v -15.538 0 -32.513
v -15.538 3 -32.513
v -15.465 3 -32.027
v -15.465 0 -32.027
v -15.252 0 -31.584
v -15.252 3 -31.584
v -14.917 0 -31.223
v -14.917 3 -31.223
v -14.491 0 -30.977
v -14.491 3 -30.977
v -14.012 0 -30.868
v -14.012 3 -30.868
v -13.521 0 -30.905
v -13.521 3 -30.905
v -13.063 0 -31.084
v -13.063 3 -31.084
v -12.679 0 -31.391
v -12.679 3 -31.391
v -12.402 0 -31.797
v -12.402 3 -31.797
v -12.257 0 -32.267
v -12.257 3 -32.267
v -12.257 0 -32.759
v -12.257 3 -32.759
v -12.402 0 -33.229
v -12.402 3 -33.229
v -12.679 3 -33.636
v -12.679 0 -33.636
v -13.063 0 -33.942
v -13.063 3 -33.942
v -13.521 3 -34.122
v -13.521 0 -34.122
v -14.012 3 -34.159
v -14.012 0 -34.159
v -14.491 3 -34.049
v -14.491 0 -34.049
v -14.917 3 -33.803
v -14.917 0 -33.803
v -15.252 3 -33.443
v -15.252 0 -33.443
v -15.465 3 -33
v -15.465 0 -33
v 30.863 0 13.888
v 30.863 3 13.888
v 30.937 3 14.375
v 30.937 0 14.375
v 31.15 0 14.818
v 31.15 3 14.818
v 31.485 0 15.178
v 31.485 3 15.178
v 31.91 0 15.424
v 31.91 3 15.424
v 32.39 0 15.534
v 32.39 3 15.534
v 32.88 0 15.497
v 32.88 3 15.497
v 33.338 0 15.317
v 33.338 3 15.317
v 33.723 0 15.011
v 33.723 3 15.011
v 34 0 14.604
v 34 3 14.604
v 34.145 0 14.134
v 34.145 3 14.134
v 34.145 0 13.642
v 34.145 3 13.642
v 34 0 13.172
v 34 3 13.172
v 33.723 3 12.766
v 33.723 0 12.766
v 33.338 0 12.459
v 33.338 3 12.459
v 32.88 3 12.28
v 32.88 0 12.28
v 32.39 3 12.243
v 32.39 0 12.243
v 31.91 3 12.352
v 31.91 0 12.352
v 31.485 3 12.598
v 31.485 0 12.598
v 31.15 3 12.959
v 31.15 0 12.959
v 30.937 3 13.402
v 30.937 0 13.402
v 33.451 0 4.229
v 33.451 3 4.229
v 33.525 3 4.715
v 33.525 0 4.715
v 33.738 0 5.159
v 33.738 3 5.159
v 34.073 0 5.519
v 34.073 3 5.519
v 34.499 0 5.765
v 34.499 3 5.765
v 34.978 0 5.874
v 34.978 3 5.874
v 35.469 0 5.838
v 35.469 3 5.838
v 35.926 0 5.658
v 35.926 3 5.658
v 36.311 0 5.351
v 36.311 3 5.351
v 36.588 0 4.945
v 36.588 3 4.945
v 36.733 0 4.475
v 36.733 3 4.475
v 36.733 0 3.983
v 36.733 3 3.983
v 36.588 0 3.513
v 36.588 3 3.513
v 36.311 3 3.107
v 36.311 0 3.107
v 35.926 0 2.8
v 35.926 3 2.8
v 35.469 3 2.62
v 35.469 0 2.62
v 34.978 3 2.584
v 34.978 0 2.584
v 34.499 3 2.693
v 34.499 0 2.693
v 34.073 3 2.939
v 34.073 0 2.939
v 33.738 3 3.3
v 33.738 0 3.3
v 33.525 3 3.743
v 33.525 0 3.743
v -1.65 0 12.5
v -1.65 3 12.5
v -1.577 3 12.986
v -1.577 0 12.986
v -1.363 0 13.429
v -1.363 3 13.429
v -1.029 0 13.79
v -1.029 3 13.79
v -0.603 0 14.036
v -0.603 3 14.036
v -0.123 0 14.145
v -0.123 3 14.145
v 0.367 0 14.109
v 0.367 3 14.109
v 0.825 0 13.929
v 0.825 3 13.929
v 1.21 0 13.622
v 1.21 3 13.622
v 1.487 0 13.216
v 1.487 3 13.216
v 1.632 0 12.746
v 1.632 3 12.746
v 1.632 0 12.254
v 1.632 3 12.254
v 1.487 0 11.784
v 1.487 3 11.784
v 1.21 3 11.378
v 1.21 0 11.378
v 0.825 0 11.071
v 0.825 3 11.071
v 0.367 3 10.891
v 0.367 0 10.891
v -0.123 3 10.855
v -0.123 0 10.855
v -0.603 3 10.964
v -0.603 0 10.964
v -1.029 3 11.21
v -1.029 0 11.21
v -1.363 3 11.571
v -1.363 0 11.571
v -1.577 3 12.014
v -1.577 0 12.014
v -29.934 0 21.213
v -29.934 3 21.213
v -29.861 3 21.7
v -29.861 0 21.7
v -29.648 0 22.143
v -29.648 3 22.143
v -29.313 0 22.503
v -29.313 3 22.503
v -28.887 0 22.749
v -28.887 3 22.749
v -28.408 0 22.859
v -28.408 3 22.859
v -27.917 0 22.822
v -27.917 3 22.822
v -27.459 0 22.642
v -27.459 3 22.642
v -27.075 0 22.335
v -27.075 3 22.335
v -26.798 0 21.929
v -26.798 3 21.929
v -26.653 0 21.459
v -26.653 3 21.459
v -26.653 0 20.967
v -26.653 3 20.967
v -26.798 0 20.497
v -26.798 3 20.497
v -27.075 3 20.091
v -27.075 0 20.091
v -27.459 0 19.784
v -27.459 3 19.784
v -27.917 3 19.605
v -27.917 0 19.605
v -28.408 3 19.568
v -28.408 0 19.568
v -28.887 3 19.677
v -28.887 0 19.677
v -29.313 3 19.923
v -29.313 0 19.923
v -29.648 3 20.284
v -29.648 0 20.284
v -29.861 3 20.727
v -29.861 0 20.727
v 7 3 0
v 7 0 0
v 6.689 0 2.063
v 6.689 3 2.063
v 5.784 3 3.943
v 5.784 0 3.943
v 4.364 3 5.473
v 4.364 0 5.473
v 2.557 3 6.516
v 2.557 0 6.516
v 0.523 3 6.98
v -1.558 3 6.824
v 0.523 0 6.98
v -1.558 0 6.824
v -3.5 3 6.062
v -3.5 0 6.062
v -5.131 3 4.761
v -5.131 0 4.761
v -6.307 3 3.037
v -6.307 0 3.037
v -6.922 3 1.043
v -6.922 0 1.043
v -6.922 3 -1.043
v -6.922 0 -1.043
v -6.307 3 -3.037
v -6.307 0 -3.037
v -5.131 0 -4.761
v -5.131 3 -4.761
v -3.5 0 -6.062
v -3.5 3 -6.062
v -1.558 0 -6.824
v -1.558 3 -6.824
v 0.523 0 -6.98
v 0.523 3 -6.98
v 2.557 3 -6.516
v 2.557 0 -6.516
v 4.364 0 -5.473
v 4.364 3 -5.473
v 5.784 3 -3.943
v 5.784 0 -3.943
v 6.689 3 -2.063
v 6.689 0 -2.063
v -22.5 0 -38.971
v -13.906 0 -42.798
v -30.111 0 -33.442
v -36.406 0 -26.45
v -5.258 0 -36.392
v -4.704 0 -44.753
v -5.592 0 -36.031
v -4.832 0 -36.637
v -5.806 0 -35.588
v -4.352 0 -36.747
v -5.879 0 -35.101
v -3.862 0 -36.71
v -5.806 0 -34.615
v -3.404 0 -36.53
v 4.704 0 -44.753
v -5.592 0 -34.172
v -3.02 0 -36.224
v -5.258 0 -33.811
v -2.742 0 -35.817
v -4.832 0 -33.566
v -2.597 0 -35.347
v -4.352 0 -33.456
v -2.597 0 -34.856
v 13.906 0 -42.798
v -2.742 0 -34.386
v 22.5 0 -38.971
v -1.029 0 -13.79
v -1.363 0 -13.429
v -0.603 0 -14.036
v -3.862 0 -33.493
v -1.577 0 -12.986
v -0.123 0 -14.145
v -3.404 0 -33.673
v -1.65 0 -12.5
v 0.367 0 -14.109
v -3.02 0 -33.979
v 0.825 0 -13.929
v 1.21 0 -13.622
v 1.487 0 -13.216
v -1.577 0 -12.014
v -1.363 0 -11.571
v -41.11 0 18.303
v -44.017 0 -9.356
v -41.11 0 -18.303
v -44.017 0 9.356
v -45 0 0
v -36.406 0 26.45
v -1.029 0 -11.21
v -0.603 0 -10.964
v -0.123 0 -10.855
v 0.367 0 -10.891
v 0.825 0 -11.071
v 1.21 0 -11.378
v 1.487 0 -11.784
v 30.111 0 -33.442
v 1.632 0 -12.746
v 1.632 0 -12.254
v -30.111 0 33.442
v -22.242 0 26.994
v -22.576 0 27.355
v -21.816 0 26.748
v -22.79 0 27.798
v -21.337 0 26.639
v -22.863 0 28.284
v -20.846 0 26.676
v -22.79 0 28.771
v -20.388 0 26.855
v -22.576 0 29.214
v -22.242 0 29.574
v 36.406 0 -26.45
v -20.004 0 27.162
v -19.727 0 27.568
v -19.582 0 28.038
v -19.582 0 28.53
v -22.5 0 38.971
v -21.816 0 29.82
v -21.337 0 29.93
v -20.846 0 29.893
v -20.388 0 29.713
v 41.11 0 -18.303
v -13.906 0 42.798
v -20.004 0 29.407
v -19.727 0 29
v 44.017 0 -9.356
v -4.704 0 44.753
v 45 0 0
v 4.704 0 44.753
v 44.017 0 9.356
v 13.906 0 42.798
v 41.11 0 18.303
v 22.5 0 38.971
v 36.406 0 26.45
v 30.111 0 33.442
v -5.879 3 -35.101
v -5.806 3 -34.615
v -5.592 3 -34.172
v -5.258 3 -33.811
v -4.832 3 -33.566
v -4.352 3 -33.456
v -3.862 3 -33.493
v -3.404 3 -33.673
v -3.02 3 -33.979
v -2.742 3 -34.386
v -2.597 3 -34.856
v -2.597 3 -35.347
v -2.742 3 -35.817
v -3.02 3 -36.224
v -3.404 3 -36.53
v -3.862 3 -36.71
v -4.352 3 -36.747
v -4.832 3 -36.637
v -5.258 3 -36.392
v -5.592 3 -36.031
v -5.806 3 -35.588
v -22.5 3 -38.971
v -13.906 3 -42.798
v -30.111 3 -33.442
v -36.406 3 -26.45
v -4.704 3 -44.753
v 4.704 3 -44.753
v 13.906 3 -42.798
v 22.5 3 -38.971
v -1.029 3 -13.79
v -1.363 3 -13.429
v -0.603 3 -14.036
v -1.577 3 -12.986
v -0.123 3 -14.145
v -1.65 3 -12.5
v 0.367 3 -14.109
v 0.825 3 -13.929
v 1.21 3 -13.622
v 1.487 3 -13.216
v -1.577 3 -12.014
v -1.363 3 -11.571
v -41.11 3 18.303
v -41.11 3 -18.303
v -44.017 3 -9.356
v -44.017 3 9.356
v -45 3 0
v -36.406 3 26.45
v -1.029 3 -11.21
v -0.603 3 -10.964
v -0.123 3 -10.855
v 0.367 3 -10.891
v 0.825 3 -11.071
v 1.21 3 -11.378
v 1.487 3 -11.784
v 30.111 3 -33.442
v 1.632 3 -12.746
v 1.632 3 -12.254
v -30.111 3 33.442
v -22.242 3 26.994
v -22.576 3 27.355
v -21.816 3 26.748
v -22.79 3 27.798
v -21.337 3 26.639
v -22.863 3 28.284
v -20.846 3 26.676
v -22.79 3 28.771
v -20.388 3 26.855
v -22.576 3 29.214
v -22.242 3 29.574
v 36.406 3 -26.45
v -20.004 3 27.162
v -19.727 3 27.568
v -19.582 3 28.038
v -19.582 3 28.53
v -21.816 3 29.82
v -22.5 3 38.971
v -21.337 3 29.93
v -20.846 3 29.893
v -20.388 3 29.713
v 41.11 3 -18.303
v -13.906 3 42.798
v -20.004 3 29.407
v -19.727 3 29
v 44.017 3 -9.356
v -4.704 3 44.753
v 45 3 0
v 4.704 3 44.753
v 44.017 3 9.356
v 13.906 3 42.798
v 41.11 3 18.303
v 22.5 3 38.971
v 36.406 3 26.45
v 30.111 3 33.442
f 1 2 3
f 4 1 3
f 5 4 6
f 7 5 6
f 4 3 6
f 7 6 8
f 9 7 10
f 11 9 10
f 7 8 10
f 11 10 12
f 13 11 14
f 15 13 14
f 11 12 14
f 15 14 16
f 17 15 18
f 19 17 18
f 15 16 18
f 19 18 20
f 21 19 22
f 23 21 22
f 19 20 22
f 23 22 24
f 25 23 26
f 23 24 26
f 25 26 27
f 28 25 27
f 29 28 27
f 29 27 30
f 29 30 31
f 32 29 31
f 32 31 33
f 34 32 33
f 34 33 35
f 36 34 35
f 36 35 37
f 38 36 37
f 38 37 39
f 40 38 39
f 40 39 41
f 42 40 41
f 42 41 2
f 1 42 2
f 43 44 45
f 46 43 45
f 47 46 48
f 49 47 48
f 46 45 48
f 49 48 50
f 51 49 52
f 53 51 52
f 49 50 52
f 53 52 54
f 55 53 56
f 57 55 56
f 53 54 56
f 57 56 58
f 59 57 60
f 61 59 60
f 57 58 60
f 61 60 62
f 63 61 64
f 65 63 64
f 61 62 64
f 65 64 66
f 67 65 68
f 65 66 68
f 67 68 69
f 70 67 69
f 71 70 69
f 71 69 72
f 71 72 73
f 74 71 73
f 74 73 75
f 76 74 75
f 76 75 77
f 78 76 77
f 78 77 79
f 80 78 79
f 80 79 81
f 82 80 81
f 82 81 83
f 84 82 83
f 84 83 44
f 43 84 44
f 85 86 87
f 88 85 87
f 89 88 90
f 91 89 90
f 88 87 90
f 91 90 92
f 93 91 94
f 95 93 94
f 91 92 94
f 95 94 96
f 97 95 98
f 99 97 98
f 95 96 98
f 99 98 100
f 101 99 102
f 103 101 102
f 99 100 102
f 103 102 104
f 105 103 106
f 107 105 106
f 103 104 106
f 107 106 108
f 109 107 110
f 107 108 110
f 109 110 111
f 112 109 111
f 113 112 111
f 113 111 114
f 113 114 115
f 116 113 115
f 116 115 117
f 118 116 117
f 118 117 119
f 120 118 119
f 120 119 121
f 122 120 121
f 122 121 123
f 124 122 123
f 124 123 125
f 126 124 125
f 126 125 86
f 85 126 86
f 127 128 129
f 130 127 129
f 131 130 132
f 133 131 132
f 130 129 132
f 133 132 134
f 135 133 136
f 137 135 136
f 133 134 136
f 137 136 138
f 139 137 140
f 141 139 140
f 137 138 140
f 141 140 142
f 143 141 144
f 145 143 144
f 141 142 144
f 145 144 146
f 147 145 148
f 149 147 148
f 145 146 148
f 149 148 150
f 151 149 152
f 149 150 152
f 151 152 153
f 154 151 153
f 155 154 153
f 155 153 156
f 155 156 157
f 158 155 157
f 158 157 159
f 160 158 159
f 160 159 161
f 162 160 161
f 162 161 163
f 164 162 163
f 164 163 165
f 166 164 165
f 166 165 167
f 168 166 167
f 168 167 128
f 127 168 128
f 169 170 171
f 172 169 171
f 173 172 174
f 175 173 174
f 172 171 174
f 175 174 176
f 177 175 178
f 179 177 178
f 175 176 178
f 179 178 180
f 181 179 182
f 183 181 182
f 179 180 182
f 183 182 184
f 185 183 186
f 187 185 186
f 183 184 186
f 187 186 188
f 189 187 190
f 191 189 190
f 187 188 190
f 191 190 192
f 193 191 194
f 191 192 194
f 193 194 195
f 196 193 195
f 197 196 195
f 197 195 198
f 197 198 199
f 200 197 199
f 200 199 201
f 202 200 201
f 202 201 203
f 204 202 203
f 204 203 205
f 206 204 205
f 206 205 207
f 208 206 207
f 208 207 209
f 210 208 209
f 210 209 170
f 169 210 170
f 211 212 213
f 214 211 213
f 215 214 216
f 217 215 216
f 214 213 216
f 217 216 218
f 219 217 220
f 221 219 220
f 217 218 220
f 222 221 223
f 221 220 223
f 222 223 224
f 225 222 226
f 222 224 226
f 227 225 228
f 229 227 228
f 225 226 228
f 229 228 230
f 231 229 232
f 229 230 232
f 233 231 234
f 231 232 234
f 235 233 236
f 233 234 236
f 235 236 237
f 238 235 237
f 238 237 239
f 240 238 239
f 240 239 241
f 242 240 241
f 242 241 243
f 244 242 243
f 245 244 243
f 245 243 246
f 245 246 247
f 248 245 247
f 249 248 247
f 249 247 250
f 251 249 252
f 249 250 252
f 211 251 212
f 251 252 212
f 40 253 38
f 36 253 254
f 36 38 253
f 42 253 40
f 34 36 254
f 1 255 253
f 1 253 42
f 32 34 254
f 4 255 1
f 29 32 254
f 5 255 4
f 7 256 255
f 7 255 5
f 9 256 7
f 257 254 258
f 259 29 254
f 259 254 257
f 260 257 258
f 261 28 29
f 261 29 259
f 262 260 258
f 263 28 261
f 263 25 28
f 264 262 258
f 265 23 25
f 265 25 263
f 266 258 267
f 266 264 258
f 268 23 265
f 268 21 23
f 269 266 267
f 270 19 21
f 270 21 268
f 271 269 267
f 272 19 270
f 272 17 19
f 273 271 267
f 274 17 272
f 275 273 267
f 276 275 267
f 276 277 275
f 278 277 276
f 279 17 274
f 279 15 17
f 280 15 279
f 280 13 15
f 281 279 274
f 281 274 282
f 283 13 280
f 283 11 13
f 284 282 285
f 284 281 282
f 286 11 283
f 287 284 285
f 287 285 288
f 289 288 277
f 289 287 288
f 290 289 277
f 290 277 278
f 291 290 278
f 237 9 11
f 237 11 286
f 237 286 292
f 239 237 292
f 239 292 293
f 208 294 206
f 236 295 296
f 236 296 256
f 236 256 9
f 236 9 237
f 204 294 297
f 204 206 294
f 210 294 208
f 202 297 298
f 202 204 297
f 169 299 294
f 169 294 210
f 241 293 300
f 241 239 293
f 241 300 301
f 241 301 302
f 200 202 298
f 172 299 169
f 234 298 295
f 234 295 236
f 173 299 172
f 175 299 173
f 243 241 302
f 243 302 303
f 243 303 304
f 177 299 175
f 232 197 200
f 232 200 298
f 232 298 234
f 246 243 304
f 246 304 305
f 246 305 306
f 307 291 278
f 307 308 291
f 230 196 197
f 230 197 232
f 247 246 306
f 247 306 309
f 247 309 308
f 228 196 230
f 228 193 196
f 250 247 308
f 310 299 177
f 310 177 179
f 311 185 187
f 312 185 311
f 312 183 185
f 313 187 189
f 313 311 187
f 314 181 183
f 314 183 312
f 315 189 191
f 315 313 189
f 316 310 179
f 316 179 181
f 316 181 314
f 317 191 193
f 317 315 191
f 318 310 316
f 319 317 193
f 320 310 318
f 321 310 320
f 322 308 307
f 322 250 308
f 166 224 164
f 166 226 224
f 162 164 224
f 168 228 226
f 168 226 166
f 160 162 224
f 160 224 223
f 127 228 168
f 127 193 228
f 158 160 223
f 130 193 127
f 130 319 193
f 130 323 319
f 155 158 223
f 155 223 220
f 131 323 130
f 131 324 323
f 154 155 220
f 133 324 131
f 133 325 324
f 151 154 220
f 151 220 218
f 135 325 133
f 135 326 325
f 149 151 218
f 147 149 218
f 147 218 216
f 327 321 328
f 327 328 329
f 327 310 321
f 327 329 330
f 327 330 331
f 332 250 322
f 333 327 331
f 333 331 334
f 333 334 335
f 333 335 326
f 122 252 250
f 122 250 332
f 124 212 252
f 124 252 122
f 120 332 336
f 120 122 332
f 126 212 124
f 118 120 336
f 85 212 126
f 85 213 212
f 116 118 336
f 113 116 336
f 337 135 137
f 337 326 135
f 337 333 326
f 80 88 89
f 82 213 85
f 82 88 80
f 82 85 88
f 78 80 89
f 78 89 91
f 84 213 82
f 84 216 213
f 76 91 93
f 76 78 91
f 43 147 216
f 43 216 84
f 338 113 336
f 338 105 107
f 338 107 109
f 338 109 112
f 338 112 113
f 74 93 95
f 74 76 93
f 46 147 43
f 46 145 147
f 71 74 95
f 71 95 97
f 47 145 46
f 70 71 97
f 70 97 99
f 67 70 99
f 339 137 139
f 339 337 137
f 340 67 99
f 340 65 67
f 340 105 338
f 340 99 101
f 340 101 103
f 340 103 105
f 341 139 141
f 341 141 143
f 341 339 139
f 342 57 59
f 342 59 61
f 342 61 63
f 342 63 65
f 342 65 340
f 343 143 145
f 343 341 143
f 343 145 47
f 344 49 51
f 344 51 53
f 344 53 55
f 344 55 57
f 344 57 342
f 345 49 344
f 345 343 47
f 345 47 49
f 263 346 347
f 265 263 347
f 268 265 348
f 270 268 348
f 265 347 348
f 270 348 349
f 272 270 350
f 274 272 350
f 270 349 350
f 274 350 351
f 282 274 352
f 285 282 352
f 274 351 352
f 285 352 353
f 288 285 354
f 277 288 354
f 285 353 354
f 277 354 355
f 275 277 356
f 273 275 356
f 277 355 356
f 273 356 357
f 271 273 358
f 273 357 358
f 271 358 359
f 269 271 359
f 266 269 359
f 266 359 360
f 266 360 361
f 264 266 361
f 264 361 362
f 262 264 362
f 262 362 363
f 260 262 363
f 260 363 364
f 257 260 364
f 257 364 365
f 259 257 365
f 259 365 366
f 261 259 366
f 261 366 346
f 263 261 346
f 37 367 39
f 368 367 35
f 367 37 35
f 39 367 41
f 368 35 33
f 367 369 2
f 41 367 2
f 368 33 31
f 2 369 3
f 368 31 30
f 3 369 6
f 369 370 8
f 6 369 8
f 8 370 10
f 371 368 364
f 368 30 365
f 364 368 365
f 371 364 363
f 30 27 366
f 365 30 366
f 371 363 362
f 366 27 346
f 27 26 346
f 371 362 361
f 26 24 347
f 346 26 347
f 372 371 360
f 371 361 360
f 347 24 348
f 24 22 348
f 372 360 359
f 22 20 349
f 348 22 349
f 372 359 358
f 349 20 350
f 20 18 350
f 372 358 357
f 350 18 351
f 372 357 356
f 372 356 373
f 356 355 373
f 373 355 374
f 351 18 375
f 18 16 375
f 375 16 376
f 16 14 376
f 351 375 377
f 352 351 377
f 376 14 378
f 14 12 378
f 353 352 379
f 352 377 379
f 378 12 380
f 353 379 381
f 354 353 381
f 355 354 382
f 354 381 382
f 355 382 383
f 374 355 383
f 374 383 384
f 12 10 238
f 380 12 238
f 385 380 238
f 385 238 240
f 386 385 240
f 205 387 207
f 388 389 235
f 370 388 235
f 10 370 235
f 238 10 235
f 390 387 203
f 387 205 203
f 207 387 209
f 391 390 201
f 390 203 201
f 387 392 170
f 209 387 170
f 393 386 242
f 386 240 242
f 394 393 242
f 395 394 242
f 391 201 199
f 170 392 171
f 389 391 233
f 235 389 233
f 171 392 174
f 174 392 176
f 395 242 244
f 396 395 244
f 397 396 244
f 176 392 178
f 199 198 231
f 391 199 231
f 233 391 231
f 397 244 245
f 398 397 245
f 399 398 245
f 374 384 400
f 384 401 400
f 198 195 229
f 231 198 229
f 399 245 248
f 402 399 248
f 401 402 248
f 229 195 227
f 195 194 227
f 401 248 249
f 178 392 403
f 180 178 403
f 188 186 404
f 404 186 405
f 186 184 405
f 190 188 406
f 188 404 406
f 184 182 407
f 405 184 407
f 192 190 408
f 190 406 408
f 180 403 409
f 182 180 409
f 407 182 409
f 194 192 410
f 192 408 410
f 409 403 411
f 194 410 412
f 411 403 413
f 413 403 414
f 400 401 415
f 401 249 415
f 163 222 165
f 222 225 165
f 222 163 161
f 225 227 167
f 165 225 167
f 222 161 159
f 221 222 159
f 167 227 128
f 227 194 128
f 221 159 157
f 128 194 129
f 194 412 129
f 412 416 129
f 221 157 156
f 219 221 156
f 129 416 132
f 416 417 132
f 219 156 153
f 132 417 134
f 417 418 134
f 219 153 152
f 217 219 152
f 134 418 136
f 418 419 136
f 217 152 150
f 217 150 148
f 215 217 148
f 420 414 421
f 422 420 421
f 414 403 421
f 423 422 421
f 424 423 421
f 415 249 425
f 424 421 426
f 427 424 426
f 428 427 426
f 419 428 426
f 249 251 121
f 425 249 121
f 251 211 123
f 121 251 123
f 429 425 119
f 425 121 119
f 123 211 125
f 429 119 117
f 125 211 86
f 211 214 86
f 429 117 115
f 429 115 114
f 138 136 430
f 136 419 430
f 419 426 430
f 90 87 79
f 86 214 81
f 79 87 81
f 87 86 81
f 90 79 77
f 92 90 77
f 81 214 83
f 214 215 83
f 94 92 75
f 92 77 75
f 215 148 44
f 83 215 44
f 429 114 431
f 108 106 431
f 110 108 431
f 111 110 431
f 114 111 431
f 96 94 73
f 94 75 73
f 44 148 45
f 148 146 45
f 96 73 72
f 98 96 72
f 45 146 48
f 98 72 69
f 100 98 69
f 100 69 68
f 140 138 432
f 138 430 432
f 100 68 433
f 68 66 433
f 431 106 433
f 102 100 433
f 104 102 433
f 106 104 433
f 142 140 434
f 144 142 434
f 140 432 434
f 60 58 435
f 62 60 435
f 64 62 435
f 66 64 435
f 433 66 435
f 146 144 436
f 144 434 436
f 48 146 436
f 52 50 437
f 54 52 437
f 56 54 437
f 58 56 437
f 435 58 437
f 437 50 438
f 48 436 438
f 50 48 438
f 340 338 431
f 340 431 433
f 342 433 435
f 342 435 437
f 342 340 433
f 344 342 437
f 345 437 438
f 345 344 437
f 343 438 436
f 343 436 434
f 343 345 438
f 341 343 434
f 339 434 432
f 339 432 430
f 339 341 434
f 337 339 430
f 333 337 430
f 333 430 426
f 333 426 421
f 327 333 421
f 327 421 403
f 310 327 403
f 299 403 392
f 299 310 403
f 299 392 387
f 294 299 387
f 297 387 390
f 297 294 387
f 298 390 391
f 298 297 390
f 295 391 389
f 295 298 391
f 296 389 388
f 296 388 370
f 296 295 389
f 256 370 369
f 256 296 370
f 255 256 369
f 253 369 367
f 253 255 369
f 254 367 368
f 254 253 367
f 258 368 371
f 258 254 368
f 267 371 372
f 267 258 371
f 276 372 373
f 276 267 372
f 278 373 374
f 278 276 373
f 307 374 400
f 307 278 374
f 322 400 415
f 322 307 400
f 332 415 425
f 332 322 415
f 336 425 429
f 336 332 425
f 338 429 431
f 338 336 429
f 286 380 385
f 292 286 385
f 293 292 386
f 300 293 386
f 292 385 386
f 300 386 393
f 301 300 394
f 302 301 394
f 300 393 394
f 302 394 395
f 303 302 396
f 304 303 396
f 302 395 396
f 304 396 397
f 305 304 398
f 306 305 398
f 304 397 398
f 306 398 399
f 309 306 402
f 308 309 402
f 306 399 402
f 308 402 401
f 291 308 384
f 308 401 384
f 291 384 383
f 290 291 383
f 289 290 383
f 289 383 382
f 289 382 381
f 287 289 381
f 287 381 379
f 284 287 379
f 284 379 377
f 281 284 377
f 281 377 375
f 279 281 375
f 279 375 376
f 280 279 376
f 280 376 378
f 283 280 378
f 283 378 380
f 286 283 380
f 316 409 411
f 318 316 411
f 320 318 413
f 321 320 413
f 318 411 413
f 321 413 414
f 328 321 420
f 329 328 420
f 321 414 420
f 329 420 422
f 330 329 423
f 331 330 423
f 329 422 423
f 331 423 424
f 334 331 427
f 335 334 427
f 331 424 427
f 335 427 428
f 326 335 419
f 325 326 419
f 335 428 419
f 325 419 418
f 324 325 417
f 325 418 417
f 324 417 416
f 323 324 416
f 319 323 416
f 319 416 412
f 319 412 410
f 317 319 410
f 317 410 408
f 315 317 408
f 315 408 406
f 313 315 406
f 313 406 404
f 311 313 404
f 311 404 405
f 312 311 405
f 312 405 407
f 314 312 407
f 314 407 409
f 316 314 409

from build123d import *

# Parameters (mm, degrees)
F0_R     = 45
F0_R_2   = 7
F1_DEPTH = 3
F2_D     = 3.3
F3_D     = 3.3


with BuildPart() as f1:
    # F0 (on Front) → F1 (new body)
    with BuildSketch(Plane.XZ):
        Circle(F0_R)
        Circle(F0_R_2, mode=Mode.SUBTRACT)
    extrude(amount=-F1_DEPTH)

    # F2 (through all)
    with Locations(Plane.XZ):
        with Locations((-21.2132034356, 28.2842712475), (-28.2842712475, 21.2132034356), (-13.88829571, -32.5133086946), (-4.2290374471, -35.1014991456), (35.1014991456, 4.2290374471), (32.5133086946, 13.88829571)):
            Hole(F2_D / 2)

    # F3 (through all)
    with Locations(Plane.XZ):
        with Locations((0, 12.5), (0, -12.5)):
            Hole(F3_D / 2)


solid = f1.part
